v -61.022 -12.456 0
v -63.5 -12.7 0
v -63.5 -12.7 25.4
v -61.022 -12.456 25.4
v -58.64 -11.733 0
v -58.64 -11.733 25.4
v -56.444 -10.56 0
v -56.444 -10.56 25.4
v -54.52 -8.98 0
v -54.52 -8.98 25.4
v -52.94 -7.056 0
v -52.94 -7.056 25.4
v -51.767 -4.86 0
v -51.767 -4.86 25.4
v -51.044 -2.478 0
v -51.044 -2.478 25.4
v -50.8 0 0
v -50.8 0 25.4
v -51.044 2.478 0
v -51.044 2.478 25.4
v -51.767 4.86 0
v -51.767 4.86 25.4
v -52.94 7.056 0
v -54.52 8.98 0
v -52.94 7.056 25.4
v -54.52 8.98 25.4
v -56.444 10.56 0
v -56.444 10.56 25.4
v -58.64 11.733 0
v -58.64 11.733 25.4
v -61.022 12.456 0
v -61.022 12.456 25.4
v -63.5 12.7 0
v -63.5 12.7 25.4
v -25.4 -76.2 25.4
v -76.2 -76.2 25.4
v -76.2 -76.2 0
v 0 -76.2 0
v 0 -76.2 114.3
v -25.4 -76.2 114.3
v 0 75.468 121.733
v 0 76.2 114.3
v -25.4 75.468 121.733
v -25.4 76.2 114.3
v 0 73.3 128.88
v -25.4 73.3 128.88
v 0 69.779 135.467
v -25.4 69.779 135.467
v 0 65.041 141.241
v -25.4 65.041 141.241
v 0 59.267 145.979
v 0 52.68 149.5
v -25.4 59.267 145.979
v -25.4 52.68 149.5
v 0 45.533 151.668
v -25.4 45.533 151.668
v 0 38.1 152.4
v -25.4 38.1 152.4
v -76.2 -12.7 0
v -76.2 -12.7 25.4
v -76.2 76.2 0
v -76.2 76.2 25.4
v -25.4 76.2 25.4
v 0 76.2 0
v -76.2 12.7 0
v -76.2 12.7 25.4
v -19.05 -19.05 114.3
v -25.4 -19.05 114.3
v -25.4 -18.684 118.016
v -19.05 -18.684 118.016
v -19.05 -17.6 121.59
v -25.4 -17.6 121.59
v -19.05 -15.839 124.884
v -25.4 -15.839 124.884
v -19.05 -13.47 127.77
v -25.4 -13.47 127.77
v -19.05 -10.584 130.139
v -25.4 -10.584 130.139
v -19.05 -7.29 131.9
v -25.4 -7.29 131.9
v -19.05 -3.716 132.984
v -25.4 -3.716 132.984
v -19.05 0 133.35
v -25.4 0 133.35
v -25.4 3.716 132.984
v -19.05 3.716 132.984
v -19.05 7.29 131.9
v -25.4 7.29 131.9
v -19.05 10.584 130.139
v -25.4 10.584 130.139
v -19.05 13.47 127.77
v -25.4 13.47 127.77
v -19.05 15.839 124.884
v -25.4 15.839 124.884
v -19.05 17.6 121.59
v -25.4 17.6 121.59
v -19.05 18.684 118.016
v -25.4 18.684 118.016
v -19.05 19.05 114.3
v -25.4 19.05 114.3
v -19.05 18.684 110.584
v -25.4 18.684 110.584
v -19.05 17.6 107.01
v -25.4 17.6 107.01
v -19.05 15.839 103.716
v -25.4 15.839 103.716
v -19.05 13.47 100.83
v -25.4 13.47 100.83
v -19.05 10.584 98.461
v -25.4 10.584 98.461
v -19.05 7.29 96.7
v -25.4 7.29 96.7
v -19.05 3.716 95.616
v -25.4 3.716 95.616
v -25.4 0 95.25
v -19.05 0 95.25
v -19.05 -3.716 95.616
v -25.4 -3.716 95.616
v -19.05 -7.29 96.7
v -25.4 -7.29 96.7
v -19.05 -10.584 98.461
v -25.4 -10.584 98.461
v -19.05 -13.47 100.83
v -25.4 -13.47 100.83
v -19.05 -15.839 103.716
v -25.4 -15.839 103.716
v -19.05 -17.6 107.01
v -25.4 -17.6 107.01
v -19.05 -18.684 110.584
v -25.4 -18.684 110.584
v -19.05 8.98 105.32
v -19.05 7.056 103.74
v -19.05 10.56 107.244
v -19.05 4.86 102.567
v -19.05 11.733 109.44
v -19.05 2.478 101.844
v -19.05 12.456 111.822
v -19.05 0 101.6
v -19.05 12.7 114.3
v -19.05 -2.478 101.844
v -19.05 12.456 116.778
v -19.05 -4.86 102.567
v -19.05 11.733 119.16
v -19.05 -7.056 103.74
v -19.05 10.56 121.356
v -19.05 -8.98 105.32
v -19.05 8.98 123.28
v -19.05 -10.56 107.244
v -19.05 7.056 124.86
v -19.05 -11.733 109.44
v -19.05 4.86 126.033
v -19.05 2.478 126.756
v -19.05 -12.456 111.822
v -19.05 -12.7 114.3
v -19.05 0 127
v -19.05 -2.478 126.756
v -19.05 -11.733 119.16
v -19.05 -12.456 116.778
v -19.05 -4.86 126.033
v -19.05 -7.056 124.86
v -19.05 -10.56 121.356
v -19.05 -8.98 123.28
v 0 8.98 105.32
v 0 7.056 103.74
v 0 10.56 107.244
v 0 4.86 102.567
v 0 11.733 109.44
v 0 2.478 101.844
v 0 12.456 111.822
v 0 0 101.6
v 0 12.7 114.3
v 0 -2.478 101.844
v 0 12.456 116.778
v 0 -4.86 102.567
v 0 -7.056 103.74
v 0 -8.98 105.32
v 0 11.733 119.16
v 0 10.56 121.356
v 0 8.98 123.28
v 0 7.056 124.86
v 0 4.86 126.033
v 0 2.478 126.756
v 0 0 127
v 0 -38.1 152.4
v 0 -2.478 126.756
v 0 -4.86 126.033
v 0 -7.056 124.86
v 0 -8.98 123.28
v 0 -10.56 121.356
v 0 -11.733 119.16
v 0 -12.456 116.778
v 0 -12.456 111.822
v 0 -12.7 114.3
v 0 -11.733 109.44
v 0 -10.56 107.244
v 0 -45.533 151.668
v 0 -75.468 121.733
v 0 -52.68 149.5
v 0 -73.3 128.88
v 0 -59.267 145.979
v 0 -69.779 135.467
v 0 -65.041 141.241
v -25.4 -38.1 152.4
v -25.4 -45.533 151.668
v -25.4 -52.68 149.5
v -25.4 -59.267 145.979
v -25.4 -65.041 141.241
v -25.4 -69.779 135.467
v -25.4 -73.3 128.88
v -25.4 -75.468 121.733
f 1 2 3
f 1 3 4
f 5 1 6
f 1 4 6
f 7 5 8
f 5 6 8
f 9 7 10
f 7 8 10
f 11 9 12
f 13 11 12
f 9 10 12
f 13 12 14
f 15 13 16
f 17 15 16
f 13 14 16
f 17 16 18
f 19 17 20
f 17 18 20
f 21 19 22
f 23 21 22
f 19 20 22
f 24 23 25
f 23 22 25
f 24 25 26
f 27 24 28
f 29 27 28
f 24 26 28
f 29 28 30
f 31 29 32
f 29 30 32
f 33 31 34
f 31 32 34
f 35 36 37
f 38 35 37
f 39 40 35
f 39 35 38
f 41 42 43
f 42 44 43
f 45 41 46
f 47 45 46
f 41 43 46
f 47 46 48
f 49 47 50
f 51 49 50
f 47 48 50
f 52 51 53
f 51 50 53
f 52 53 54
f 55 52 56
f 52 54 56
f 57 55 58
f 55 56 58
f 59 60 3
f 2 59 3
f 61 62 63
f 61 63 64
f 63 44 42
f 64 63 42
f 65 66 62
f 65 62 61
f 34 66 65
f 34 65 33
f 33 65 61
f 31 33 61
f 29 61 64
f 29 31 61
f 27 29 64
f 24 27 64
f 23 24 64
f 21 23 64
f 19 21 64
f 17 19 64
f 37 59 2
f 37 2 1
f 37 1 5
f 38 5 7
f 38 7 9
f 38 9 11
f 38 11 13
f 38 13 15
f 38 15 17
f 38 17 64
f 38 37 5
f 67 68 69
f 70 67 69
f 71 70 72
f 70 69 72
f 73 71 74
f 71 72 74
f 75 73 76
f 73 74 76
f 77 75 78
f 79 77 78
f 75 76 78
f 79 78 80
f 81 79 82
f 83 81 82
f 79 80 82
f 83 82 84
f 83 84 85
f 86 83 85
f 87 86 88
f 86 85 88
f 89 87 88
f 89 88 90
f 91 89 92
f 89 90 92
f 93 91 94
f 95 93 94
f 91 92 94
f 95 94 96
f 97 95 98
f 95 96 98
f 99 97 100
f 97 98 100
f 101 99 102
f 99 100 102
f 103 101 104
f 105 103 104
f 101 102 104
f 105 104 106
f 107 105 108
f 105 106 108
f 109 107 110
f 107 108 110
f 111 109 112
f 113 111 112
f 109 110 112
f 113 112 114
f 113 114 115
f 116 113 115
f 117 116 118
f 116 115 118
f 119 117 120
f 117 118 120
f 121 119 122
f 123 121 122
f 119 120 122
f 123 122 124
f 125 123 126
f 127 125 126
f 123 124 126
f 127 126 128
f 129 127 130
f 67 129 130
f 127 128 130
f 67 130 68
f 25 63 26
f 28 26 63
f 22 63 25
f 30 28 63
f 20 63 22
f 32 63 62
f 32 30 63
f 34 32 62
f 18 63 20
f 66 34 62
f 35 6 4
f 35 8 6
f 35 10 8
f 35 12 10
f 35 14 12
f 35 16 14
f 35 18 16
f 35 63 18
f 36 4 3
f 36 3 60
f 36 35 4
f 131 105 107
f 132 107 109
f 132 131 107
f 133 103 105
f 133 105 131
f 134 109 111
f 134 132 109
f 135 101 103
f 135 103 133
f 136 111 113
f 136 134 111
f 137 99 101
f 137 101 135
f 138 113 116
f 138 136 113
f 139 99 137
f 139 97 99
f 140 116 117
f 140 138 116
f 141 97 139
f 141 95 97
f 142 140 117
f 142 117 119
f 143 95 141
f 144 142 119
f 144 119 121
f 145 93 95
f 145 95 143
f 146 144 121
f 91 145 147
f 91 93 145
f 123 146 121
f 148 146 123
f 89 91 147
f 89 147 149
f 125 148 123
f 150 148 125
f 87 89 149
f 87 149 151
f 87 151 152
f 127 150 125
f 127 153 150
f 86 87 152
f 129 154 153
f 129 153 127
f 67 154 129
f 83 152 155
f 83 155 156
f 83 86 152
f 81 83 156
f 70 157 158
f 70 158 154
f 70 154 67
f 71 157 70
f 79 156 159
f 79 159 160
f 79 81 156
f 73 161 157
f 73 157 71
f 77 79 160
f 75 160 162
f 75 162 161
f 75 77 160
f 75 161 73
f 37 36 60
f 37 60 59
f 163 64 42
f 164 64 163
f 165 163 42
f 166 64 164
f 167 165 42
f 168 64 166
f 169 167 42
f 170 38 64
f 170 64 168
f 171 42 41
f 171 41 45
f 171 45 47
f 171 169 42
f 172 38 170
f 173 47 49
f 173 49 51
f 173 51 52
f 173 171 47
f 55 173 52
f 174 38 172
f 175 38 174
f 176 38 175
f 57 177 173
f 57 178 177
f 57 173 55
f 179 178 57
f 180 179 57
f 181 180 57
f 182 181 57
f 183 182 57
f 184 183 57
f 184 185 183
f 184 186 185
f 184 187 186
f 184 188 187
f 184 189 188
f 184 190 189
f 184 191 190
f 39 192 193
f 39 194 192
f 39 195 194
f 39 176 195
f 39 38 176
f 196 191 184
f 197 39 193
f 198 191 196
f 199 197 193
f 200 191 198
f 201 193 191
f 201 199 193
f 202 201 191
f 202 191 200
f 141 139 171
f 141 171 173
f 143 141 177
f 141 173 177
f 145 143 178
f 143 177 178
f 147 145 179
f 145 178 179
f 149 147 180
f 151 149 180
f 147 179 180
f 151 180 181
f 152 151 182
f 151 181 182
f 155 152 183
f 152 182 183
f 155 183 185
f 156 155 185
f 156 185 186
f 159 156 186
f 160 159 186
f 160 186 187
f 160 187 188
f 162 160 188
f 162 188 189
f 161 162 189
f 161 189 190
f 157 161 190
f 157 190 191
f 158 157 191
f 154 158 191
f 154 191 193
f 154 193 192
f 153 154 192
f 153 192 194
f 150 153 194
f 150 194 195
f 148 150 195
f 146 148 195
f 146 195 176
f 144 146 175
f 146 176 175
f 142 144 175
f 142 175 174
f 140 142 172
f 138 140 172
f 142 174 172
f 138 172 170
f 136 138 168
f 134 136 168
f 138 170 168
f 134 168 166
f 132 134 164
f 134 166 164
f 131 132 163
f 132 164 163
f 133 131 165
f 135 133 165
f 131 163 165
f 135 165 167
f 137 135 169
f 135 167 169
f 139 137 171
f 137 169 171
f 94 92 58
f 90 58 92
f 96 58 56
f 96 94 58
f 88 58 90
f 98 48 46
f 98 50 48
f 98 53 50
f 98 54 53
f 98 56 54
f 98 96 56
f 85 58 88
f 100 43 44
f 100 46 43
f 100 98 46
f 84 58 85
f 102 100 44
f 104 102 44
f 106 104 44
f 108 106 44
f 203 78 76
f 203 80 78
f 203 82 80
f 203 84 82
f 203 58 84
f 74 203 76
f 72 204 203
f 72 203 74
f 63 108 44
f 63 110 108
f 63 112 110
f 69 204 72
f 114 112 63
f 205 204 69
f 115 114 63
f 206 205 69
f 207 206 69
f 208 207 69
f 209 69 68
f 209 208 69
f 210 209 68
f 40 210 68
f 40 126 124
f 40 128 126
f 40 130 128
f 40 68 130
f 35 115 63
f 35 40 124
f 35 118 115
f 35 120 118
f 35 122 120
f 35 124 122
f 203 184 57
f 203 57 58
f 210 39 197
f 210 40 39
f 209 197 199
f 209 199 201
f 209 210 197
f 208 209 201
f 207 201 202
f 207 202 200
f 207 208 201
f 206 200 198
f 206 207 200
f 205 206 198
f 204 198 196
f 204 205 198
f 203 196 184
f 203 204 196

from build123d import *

# Parameters (mm, degrees)
F1_DEPTH = 76.2
F2_R     = 12.7
F3_DEPTH = 76.201
F4_W     = 12.7
F4_H     = 25.4
F5_DEPTH = 25.401
F7_R     = 38.1
F6_R     = 19.05
F8_DEPTH = 6.35


with BuildPart() as f1:
    # F0 (on Front) → F1 (new body, symmetric)
    with BuildSketch(Plane.XZ):
        Polygon((-76.2, 0), (0, 0), (0, 152.4), (-25.4, 152.4), (-25.4, 25.4), (-76.2, 25.4), align=None)
    extrude(amount=F1_DEPTH, both=True)

    # F2 (on Right) → F3 (cut, through all)
    with BuildSketch(Plane.YZ):
        with Locations((0, 114.3)):
            Circle(F2_R)
    extrude(amount=-F3_DEPTH, mode=Mode.SUBTRACT)

    # F4 (on face) → F5 (cut, through all)
    with BuildSketch(Plane.XY.offset(25.4)):
        with Locations((-69.85, 0)):
            Rectangle(F4_W, F4_H)
        with BuildLine():
            ThreePointArc((-63.5, -12.7), (-50.8, 0), (-63.5, 12.7))
            Line((-63.5, 12.7), (-63.5, -12.7))
        make_face()
    extrude(amount=-F5_DEPTH, mode=Mode.SUBTRACT)

    # F7
    f7_edges = [f1.edges().sort_by_distance(p)[0] for p in [
        (-12.7, 76.2, 152.4),
        (-12.7, -76.2, 152.4),
    ]]
    fillet(f7_edges, radius=F7_R)

    # F6 (on face) → F8 (cut)
    with BuildSketch(Plane(origin=(-25.4, 0, 0), x_dir=(0, -1, 0), z_dir=(-1, 0, 0))):
        with Locations((0, 114.3)):
            Circle(F6_R)
    extrude(amount=-F8_DEPTH, mode=Mode.SUBTRACT)


solid = f1.part
